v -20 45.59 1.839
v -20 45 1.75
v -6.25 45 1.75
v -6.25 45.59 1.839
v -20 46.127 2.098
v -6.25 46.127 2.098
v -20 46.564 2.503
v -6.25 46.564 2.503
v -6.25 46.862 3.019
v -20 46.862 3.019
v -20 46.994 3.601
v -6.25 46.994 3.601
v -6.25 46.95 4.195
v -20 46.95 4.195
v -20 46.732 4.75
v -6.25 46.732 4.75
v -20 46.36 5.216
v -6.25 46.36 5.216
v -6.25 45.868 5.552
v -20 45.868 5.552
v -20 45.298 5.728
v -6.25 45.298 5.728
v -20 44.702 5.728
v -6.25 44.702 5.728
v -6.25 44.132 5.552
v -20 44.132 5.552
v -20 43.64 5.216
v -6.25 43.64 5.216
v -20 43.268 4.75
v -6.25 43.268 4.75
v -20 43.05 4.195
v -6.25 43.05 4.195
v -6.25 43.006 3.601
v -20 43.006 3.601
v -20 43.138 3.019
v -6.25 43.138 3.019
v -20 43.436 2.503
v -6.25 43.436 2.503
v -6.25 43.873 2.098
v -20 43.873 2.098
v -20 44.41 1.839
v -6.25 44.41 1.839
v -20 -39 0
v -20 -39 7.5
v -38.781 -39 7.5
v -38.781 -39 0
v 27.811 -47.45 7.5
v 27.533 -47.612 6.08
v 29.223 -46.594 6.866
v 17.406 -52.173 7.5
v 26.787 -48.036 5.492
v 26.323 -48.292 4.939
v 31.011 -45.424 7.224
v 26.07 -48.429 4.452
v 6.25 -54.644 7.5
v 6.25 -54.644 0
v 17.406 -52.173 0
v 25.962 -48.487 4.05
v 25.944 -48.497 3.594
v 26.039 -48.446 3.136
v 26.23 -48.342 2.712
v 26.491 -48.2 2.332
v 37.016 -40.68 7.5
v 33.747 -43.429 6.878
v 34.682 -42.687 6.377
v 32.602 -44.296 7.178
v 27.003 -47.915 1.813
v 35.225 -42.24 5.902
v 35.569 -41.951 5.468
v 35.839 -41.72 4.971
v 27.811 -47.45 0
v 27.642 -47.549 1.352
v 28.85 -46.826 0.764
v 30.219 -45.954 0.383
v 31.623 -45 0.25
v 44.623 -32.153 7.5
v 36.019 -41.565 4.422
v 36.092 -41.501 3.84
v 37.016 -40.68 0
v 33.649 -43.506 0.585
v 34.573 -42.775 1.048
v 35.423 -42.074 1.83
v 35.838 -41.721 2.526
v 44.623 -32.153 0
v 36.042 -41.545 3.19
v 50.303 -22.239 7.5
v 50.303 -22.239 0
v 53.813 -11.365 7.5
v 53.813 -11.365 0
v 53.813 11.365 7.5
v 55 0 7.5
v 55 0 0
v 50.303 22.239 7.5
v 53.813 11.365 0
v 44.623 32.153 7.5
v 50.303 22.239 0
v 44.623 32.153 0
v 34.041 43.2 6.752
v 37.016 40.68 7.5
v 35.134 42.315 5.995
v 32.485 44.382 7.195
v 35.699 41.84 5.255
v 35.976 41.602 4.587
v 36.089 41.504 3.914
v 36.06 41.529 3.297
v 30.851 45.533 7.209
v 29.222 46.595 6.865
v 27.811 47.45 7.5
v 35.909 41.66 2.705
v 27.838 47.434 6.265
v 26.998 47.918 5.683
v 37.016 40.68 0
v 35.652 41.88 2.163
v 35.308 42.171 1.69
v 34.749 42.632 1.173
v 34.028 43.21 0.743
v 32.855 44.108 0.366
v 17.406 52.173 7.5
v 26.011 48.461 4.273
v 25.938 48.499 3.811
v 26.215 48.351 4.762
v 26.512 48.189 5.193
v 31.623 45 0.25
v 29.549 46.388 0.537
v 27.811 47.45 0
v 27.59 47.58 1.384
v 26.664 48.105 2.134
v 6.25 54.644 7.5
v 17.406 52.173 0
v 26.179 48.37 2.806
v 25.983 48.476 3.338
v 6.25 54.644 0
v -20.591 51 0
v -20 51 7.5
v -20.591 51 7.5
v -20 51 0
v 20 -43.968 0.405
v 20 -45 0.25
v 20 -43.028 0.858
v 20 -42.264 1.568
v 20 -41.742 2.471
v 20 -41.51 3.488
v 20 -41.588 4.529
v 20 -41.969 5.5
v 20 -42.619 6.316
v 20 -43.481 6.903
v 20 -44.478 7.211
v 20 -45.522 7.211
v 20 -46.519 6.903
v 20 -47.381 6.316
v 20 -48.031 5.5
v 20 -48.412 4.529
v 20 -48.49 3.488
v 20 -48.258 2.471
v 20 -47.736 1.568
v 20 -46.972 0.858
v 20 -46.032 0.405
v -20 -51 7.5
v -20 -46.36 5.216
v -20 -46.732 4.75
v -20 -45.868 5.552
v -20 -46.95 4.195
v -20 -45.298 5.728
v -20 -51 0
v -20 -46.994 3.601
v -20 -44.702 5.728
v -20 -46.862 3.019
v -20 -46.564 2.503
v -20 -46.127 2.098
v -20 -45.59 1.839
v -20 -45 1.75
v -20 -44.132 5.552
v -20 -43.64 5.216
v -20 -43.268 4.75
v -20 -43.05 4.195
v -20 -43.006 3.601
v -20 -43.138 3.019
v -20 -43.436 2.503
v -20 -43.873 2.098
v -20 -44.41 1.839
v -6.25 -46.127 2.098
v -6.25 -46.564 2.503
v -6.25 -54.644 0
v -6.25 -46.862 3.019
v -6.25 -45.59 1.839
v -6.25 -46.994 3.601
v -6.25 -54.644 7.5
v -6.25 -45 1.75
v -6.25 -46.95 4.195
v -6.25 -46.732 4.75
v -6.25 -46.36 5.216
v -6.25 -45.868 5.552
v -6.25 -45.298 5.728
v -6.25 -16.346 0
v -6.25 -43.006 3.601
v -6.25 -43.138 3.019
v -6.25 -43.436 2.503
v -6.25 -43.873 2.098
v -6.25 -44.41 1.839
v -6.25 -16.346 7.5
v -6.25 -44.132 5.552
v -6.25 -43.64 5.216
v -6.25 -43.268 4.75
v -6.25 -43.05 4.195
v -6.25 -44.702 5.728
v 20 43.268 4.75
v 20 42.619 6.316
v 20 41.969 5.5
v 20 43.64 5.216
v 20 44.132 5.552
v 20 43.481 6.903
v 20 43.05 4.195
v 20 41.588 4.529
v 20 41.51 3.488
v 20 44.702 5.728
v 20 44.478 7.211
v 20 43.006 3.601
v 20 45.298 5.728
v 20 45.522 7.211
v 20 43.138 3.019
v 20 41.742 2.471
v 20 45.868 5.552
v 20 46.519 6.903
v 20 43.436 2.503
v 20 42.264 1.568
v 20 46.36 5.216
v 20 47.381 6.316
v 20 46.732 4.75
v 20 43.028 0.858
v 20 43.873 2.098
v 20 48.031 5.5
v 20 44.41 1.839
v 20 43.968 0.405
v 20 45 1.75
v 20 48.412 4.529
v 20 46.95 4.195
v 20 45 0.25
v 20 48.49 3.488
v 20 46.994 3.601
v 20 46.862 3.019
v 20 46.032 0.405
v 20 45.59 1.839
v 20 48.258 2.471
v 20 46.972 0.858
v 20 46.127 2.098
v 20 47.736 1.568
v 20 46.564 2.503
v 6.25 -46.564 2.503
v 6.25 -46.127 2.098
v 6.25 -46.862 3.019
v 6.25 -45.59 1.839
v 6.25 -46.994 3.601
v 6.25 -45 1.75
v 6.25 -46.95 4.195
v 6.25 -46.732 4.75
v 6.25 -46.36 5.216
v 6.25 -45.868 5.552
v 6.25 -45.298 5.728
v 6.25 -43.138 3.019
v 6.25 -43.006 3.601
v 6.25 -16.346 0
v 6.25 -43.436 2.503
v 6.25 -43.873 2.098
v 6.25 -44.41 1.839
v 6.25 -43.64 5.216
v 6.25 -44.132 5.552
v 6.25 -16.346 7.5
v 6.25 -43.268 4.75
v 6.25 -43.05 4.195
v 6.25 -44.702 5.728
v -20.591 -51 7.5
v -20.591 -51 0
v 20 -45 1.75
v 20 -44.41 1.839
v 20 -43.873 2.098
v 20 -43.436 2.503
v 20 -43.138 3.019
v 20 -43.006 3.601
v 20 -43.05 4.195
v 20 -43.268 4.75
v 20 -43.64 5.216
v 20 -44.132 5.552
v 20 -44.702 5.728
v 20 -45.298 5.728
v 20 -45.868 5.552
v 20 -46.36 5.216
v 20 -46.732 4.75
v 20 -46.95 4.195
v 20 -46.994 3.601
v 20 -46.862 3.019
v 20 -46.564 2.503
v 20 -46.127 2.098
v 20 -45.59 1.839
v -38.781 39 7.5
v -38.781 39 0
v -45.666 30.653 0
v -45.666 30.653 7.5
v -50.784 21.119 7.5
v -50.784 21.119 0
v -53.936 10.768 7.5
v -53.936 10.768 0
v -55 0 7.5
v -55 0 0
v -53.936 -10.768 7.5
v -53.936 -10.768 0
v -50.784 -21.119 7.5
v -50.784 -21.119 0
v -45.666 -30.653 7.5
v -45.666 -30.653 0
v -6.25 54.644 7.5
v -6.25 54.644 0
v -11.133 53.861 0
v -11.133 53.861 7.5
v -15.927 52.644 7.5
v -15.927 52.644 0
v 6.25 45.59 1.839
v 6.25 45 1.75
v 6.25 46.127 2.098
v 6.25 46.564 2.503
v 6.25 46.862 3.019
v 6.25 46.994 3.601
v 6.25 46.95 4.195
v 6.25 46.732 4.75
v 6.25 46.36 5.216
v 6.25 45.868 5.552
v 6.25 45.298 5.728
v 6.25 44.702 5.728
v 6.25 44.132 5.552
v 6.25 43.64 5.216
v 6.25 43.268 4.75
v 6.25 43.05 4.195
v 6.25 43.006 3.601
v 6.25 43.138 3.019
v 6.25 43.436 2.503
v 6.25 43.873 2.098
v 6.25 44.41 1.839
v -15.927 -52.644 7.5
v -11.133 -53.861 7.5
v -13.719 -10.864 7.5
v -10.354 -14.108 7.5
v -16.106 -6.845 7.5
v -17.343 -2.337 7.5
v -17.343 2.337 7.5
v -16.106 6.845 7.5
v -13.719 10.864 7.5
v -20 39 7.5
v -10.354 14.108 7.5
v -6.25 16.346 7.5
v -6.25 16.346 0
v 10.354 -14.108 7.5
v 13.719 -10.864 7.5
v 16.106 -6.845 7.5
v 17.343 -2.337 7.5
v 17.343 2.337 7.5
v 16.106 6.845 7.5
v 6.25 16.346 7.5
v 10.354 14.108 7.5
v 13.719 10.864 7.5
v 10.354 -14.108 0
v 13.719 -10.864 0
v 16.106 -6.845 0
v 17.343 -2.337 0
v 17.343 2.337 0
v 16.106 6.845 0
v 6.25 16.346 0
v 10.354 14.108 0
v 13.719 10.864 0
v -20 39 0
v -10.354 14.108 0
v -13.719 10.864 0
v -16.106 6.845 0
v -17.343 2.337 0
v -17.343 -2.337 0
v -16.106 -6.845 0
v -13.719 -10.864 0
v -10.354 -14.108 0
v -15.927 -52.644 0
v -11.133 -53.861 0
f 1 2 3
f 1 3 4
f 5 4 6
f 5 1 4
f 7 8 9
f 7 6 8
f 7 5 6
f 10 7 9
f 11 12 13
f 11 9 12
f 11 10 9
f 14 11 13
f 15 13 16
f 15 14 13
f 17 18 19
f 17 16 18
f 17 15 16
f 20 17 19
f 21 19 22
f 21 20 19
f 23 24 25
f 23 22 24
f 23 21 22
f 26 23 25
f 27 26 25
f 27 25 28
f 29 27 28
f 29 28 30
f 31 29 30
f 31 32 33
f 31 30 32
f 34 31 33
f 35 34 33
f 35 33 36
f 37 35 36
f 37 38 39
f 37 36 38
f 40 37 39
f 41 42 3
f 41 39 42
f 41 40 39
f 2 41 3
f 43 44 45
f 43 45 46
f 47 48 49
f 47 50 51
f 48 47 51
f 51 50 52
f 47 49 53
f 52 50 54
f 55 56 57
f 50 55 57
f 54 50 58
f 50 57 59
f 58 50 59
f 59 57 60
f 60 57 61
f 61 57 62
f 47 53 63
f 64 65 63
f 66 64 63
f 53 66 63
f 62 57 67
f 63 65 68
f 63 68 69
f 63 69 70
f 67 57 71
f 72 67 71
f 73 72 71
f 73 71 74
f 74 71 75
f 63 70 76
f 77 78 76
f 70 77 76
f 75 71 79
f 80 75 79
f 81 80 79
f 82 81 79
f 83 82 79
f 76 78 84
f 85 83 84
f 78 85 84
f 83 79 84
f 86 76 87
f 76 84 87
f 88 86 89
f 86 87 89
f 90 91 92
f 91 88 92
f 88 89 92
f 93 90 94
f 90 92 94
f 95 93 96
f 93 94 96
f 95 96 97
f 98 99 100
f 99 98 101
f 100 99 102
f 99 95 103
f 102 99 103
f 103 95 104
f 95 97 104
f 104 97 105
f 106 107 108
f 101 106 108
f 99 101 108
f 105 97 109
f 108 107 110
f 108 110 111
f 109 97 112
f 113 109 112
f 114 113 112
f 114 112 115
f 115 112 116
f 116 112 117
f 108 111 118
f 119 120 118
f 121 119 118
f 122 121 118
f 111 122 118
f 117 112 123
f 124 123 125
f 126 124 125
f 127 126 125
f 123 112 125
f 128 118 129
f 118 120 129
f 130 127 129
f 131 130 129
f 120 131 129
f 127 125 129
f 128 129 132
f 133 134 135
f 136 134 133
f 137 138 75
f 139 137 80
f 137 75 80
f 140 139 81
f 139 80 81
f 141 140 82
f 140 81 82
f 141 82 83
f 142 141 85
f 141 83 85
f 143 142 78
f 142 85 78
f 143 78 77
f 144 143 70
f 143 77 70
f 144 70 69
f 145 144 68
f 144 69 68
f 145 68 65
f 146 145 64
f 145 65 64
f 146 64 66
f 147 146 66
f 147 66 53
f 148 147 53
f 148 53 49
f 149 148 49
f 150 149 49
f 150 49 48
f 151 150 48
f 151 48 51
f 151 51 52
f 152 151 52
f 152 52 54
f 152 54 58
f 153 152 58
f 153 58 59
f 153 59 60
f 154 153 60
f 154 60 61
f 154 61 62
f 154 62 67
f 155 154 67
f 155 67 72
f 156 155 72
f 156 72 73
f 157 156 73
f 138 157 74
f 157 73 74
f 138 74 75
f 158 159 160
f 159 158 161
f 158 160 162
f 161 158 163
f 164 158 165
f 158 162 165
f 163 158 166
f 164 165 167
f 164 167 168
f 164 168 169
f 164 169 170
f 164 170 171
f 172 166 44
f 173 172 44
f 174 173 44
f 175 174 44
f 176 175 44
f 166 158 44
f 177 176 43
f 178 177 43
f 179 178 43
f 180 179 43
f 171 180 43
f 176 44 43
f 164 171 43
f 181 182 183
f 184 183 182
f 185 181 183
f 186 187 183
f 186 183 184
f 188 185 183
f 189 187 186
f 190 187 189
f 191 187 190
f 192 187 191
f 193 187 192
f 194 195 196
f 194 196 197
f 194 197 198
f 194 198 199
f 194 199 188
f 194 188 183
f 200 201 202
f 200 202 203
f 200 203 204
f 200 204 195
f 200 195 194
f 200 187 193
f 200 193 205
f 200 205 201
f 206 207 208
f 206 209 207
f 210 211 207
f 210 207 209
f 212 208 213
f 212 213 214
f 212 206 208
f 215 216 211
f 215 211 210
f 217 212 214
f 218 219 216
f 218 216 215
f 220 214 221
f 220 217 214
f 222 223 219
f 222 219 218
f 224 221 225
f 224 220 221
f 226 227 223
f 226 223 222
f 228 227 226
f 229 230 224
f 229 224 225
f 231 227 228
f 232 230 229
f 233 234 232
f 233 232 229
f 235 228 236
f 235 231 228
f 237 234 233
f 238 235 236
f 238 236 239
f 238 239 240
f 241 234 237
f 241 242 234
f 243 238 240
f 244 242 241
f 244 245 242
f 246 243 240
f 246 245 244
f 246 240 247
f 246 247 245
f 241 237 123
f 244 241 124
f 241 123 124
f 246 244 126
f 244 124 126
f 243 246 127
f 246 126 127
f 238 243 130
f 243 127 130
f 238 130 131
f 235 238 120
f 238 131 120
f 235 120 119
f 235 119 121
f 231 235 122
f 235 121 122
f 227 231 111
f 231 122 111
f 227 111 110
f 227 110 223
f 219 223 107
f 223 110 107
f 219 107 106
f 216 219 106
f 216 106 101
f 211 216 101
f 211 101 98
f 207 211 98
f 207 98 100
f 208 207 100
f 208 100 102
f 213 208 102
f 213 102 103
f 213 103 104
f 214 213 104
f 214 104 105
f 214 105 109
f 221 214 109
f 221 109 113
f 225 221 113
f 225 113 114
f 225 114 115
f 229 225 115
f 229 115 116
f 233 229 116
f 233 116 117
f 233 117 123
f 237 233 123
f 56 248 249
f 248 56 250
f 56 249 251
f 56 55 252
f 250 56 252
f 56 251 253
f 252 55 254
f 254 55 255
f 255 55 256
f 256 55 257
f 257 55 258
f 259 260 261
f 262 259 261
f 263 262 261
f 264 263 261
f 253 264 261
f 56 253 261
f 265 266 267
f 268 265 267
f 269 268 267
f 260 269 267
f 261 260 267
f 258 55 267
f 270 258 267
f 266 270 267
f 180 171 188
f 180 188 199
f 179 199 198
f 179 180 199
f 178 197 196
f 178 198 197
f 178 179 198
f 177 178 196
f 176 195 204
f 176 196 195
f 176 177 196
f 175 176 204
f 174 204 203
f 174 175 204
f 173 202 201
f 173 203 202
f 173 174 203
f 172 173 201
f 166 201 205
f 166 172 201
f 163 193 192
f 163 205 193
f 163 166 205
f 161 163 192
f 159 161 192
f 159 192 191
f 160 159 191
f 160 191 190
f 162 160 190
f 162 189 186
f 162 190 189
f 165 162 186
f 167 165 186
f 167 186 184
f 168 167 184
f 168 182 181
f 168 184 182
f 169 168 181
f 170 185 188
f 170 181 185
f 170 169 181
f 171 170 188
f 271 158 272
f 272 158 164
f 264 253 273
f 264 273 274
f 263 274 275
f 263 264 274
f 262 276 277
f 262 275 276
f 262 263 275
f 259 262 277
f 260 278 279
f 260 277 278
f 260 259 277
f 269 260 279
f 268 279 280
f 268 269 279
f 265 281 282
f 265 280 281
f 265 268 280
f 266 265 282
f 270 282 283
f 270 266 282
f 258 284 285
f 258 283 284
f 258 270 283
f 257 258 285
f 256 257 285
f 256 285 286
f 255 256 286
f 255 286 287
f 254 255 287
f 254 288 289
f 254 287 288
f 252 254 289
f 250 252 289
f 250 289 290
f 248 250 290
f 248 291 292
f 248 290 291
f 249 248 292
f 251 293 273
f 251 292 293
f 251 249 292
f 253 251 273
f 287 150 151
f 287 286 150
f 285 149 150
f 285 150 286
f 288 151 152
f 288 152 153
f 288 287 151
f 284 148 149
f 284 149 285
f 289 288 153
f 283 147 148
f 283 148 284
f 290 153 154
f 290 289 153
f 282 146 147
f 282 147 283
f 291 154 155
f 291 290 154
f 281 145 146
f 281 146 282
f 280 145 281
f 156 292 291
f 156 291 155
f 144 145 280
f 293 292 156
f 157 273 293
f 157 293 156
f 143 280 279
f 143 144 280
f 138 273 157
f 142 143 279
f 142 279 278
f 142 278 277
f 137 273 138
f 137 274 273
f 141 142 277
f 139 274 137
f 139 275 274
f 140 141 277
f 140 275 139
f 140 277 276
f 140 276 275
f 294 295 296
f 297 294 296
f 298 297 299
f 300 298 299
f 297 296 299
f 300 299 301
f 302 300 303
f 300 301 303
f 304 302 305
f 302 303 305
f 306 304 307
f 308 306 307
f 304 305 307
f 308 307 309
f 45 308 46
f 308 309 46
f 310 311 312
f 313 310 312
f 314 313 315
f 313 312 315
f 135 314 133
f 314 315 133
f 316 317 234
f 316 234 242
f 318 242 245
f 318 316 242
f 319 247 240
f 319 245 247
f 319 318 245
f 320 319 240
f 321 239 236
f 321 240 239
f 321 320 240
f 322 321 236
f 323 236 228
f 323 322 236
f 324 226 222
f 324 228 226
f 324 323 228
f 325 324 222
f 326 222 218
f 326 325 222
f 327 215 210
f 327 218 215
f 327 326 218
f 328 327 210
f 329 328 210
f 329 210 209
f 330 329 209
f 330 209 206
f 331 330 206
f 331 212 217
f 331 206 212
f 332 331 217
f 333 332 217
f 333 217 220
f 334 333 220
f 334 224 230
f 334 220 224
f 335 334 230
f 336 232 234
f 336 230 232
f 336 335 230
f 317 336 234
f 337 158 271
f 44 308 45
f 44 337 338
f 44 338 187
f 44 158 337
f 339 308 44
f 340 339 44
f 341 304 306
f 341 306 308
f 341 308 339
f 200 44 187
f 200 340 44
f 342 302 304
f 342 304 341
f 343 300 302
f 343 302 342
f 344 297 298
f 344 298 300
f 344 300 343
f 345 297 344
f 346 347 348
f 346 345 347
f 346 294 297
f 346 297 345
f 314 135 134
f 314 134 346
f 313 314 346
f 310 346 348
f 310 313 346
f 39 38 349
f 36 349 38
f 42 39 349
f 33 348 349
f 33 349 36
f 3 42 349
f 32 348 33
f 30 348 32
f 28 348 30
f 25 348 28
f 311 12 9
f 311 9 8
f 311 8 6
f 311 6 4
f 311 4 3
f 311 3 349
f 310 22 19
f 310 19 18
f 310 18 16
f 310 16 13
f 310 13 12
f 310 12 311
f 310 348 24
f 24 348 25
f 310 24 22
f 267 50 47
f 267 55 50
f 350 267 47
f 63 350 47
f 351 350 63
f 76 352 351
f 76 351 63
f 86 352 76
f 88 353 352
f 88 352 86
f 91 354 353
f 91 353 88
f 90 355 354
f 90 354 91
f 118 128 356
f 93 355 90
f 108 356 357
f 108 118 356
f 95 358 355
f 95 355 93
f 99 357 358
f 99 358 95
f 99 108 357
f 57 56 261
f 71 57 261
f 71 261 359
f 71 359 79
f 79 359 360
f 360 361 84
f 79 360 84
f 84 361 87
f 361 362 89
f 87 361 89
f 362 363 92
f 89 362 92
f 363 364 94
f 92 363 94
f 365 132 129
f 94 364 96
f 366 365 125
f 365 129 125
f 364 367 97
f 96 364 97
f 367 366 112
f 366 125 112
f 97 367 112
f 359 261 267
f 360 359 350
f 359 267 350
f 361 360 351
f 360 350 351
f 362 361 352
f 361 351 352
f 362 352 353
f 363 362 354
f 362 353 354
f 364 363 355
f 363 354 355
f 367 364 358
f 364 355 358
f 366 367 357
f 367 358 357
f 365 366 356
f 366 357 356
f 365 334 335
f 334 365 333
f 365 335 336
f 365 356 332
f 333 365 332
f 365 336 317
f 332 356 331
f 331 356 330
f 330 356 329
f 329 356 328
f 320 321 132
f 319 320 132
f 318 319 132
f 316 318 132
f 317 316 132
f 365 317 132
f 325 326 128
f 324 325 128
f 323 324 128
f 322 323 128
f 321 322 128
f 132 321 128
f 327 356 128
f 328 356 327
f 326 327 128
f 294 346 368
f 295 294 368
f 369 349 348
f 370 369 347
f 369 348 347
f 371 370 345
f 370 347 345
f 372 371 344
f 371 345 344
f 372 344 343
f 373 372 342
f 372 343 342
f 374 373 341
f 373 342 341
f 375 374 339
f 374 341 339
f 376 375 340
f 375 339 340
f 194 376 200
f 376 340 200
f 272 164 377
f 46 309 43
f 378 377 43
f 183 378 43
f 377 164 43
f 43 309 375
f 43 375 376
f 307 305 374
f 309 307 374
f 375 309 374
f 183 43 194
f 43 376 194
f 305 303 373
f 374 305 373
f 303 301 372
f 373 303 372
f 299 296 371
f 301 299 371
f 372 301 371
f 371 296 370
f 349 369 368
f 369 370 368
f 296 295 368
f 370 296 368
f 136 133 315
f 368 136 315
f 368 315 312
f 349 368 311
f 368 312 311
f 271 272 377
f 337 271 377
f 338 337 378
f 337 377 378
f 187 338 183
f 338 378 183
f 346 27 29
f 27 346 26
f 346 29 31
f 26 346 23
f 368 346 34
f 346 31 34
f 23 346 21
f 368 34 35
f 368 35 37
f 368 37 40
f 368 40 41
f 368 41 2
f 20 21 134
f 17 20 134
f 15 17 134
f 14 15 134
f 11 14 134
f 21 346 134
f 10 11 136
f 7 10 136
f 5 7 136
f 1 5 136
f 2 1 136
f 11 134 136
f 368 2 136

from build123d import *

# Parameters (mm, degrees)
SKETCH1_R               = 55
BOSS_EXTRUDE1_DEPTH     = 7.5
SKETCH2_R               = 17.5
CUT_EXTRUDE1_DEPTH      = 79.14249804
SKETCH3_W               = 12.5
SKETCH3_H               = 122.150565914
CUT_EXTRUDE2_DEPTH      = 79.14249804
CUT_EXTRUDE3_DEPTH      = 78.892153007
CUT_EXTRUDE3_DEPTH_BACK = 78.892153007
SKETCH4_R               = 2
CUT_EXTRUDE5_START      = 40
SKETCH5_R               = 3.5
CUT_EXTRUDE5_DEPTH      = 20
CUT_EXTRUDE6_START      = -20
SKETCH6_W               = 7.5
SKETCH6_H               = 12
CUT_EXTRUDE6_DEPTH      = 20


with BuildPart() as part:
    # Sketch1 → Boss-Extrude1 (new body)
    with BuildSketch(Plane.XY):
        Circle(SKETCH1_R)
    extrude(amount=BOSS_EXTRUDE1_DEPTH)

    # Sketch2 → Cut-Extrude1 (cut, through all)
    with BuildSketch(Plane.XY.offset(7.5)):
        Circle(SKETCH2_R)
    extrude(amount=-CUT_EXTRUDE1_DEPTH, mode=Mode.SUBTRACT)

    # Sketch3 → Cut-Extrude2 (cut, through all)
    with BuildSketch(Plane.XY.offset(7.5)):
        Rectangle(SKETCH3_W, SKETCH3_H)
    extrude(amount=-CUT_EXTRUDE2_DEPTH, mode=Mode.SUBTRACT)


with BuildPart() as cut_extrude2_piece_1:
    # of the separate pieces the step leaves, piece 1, a body of its own (cut_extrude2_pieces)
    add(part.part.solids().sort_by_distance((6.25, -54.643732486, 0))[0])


with BuildPart() as cut_extrude2_piece_2:
    # of the separate pieces the step leaves, piece 2, a body of its own (cut_extrude2_pieces)
    add(part.part.solids().sort_by_distance((-6.25, 54.643732486, 0))[0])


with BuildPart() as cut_extrude3_tool:
    # Sketch4 → Cut-Extrude3 (new, two sides: drawn at the far end of the back side and taken through both)
    with BuildSketch(Plane(origin=(0, 0, 0), x_dir=(0, 0, -1), z_dir=(1, 0, 0)).offset(-CUT_EXTRUDE3_DEPTH_BACK)):
        with Locations((-3.75, 45)):
            Circle(SKETCH4_R)
        with Locations((-3.75, -45)):
            Circle(SKETCH4_R)
    extrude(amount=CUT_EXTRUDE3_DEPTH + CUT_EXTRUDE3_DEPTH_BACK)


with BuildPart() as cut_extrude2_piece_1_1:
    add(cut_extrude2_piece_1.part)

    # Cut-Extrude3: cut by cut_extrude3_tool
    add(cut_extrude3_tool.part, mode=Mode.SUBTRACT)

    # Sketch5 → Cut-Extrude5 (cut)
    with BuildSketch(Plane(origin=(0, 0, 0), x_dir=(0, 0, -1), z_dir=(1, 0, 0)).offset(CUT_EXTRUDE5_START)):
        with Locations((-3.75, 45)):
            Circle(SKETCH5_R)
        with Locations((-3.75, -45)):
            Circle(SKETCH5_R)
    extrude(amount=-CUT_EXTRUDE5_DEPTH, mode=Mode.SUBTRACT)


with BuildPart() as cut_extrude2_piece_2_1:
    add(cut_extrude2_piece_2.part)

    # Cut-Extrude3: cut by cut_extrude3_tool
    add(cut_extrude3_tool.part, mode=Mode.SUBTRACT)

    # Sketch6 → Cut-Extrude6 (cut)
    with BuildSketch(Plane(origin=(0, 0, 0), x_dir=(0, 0, -1), z_dir=(1, 0, 0)).offset(CUT_EXTRUDE6_START)):
        with Locations((-3.75, 45)):
            Rectangle(SKETCH6_W, SKETCH6_H)
        with Locations((-3.75, -45)):
            Rectangle(SKETCH6_W, SKETCH6_H)
    extrude(amount=-CUT_EXTRUDE6_DEPTH, mode=Mode.SUBTRACT)


solid = Compound([cut_extrude2_piece_1_1.part, cut_extrude2_piece_2_1.part])
